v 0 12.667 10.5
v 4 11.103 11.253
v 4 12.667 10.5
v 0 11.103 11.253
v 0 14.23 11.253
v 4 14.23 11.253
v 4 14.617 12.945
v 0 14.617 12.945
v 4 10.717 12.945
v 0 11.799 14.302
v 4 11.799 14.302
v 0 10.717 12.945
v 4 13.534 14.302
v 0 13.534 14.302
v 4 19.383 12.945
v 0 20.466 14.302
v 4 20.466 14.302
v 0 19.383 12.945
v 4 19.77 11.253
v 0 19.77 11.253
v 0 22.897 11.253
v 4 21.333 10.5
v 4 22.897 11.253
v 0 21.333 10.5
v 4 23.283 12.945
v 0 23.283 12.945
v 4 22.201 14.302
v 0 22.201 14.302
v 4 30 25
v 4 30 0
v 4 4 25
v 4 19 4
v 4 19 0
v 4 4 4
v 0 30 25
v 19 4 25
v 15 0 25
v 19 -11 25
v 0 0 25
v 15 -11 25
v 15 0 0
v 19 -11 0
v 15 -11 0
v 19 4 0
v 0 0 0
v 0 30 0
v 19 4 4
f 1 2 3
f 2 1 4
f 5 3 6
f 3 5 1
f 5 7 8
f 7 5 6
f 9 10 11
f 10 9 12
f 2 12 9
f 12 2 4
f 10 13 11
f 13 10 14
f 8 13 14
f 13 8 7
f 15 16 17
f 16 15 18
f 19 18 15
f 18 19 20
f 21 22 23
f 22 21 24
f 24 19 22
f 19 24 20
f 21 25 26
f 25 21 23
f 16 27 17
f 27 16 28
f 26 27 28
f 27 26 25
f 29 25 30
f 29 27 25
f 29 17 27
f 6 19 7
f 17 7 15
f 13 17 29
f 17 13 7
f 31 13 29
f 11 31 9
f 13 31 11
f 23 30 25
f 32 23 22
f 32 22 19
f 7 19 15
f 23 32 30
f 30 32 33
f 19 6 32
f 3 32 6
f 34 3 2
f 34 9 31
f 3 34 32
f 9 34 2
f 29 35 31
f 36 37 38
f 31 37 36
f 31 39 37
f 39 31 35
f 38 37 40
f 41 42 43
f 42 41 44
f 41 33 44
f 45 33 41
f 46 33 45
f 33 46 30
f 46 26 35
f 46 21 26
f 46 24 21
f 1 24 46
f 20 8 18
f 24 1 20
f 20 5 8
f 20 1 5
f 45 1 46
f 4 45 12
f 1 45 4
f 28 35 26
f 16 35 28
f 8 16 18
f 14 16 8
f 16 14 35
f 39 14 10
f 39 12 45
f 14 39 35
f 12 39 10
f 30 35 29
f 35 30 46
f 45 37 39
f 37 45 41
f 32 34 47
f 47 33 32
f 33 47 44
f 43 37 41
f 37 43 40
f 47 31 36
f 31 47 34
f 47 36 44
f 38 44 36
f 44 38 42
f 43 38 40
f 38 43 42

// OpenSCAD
// preview[view:north east, tilt:top diagonal]
$fs = 2*1;
$fa = 2*1;

//how wide should the part be?
wall_width = 25; //[15:50]

//how thick (strong) should the walls be?
wall_depth = 4; //[4:10]

//how far from the attached surface should the lip be?
hook_depth = 15; //[10:30]

//how high should the lip go?
hook_lip = 15; //[10:30]

//how tall should the attaching part be?
anchor_height = 30; //[30:100]

//diameter of screw hole
screw_diameter = 4; //[4:10]
screw_r = screw_diameter / 2;

//what is the additional width of the widest part of the flange
screw_flange = 0; //[0:5]

sqrt2 = sqrt(2);

cube([hook_depth, wall_depth, wall_width]);
translate([hook_depth, wall_depth-hook_lip, 0])
	cube([wall_depth, hook_lip, wall_width]);
difference() {
	cube([wall_depth, anchor_height, wall_width]);
	
	for(y=[1:2]) {
		translate([-1, wall_depth + (y * (anchor_height - wall_depth) / 3), wall_width / 2])
		rotate([0, 90, 0])
			screw_hole();
	}
}
intersection() {
	cube([hook_depth + wall_depth, hook_depth + wall_depth, wall_depth]);
	rotate([0, 0, 45])
		translate([-sqrt2 * hook_depth / 2, -sqrt2 * hook_depth / 2, 0])
			cube([sqrt2 * (hook_depth + wall_depth), sqrt2 * (hook_depth + wall_depth), wall_depth]);
}

module screw_hole() {
	cylinder(r1=screw_r, r2 = screw_r + screw_flange/2, h=wall_depth + 2);
}
